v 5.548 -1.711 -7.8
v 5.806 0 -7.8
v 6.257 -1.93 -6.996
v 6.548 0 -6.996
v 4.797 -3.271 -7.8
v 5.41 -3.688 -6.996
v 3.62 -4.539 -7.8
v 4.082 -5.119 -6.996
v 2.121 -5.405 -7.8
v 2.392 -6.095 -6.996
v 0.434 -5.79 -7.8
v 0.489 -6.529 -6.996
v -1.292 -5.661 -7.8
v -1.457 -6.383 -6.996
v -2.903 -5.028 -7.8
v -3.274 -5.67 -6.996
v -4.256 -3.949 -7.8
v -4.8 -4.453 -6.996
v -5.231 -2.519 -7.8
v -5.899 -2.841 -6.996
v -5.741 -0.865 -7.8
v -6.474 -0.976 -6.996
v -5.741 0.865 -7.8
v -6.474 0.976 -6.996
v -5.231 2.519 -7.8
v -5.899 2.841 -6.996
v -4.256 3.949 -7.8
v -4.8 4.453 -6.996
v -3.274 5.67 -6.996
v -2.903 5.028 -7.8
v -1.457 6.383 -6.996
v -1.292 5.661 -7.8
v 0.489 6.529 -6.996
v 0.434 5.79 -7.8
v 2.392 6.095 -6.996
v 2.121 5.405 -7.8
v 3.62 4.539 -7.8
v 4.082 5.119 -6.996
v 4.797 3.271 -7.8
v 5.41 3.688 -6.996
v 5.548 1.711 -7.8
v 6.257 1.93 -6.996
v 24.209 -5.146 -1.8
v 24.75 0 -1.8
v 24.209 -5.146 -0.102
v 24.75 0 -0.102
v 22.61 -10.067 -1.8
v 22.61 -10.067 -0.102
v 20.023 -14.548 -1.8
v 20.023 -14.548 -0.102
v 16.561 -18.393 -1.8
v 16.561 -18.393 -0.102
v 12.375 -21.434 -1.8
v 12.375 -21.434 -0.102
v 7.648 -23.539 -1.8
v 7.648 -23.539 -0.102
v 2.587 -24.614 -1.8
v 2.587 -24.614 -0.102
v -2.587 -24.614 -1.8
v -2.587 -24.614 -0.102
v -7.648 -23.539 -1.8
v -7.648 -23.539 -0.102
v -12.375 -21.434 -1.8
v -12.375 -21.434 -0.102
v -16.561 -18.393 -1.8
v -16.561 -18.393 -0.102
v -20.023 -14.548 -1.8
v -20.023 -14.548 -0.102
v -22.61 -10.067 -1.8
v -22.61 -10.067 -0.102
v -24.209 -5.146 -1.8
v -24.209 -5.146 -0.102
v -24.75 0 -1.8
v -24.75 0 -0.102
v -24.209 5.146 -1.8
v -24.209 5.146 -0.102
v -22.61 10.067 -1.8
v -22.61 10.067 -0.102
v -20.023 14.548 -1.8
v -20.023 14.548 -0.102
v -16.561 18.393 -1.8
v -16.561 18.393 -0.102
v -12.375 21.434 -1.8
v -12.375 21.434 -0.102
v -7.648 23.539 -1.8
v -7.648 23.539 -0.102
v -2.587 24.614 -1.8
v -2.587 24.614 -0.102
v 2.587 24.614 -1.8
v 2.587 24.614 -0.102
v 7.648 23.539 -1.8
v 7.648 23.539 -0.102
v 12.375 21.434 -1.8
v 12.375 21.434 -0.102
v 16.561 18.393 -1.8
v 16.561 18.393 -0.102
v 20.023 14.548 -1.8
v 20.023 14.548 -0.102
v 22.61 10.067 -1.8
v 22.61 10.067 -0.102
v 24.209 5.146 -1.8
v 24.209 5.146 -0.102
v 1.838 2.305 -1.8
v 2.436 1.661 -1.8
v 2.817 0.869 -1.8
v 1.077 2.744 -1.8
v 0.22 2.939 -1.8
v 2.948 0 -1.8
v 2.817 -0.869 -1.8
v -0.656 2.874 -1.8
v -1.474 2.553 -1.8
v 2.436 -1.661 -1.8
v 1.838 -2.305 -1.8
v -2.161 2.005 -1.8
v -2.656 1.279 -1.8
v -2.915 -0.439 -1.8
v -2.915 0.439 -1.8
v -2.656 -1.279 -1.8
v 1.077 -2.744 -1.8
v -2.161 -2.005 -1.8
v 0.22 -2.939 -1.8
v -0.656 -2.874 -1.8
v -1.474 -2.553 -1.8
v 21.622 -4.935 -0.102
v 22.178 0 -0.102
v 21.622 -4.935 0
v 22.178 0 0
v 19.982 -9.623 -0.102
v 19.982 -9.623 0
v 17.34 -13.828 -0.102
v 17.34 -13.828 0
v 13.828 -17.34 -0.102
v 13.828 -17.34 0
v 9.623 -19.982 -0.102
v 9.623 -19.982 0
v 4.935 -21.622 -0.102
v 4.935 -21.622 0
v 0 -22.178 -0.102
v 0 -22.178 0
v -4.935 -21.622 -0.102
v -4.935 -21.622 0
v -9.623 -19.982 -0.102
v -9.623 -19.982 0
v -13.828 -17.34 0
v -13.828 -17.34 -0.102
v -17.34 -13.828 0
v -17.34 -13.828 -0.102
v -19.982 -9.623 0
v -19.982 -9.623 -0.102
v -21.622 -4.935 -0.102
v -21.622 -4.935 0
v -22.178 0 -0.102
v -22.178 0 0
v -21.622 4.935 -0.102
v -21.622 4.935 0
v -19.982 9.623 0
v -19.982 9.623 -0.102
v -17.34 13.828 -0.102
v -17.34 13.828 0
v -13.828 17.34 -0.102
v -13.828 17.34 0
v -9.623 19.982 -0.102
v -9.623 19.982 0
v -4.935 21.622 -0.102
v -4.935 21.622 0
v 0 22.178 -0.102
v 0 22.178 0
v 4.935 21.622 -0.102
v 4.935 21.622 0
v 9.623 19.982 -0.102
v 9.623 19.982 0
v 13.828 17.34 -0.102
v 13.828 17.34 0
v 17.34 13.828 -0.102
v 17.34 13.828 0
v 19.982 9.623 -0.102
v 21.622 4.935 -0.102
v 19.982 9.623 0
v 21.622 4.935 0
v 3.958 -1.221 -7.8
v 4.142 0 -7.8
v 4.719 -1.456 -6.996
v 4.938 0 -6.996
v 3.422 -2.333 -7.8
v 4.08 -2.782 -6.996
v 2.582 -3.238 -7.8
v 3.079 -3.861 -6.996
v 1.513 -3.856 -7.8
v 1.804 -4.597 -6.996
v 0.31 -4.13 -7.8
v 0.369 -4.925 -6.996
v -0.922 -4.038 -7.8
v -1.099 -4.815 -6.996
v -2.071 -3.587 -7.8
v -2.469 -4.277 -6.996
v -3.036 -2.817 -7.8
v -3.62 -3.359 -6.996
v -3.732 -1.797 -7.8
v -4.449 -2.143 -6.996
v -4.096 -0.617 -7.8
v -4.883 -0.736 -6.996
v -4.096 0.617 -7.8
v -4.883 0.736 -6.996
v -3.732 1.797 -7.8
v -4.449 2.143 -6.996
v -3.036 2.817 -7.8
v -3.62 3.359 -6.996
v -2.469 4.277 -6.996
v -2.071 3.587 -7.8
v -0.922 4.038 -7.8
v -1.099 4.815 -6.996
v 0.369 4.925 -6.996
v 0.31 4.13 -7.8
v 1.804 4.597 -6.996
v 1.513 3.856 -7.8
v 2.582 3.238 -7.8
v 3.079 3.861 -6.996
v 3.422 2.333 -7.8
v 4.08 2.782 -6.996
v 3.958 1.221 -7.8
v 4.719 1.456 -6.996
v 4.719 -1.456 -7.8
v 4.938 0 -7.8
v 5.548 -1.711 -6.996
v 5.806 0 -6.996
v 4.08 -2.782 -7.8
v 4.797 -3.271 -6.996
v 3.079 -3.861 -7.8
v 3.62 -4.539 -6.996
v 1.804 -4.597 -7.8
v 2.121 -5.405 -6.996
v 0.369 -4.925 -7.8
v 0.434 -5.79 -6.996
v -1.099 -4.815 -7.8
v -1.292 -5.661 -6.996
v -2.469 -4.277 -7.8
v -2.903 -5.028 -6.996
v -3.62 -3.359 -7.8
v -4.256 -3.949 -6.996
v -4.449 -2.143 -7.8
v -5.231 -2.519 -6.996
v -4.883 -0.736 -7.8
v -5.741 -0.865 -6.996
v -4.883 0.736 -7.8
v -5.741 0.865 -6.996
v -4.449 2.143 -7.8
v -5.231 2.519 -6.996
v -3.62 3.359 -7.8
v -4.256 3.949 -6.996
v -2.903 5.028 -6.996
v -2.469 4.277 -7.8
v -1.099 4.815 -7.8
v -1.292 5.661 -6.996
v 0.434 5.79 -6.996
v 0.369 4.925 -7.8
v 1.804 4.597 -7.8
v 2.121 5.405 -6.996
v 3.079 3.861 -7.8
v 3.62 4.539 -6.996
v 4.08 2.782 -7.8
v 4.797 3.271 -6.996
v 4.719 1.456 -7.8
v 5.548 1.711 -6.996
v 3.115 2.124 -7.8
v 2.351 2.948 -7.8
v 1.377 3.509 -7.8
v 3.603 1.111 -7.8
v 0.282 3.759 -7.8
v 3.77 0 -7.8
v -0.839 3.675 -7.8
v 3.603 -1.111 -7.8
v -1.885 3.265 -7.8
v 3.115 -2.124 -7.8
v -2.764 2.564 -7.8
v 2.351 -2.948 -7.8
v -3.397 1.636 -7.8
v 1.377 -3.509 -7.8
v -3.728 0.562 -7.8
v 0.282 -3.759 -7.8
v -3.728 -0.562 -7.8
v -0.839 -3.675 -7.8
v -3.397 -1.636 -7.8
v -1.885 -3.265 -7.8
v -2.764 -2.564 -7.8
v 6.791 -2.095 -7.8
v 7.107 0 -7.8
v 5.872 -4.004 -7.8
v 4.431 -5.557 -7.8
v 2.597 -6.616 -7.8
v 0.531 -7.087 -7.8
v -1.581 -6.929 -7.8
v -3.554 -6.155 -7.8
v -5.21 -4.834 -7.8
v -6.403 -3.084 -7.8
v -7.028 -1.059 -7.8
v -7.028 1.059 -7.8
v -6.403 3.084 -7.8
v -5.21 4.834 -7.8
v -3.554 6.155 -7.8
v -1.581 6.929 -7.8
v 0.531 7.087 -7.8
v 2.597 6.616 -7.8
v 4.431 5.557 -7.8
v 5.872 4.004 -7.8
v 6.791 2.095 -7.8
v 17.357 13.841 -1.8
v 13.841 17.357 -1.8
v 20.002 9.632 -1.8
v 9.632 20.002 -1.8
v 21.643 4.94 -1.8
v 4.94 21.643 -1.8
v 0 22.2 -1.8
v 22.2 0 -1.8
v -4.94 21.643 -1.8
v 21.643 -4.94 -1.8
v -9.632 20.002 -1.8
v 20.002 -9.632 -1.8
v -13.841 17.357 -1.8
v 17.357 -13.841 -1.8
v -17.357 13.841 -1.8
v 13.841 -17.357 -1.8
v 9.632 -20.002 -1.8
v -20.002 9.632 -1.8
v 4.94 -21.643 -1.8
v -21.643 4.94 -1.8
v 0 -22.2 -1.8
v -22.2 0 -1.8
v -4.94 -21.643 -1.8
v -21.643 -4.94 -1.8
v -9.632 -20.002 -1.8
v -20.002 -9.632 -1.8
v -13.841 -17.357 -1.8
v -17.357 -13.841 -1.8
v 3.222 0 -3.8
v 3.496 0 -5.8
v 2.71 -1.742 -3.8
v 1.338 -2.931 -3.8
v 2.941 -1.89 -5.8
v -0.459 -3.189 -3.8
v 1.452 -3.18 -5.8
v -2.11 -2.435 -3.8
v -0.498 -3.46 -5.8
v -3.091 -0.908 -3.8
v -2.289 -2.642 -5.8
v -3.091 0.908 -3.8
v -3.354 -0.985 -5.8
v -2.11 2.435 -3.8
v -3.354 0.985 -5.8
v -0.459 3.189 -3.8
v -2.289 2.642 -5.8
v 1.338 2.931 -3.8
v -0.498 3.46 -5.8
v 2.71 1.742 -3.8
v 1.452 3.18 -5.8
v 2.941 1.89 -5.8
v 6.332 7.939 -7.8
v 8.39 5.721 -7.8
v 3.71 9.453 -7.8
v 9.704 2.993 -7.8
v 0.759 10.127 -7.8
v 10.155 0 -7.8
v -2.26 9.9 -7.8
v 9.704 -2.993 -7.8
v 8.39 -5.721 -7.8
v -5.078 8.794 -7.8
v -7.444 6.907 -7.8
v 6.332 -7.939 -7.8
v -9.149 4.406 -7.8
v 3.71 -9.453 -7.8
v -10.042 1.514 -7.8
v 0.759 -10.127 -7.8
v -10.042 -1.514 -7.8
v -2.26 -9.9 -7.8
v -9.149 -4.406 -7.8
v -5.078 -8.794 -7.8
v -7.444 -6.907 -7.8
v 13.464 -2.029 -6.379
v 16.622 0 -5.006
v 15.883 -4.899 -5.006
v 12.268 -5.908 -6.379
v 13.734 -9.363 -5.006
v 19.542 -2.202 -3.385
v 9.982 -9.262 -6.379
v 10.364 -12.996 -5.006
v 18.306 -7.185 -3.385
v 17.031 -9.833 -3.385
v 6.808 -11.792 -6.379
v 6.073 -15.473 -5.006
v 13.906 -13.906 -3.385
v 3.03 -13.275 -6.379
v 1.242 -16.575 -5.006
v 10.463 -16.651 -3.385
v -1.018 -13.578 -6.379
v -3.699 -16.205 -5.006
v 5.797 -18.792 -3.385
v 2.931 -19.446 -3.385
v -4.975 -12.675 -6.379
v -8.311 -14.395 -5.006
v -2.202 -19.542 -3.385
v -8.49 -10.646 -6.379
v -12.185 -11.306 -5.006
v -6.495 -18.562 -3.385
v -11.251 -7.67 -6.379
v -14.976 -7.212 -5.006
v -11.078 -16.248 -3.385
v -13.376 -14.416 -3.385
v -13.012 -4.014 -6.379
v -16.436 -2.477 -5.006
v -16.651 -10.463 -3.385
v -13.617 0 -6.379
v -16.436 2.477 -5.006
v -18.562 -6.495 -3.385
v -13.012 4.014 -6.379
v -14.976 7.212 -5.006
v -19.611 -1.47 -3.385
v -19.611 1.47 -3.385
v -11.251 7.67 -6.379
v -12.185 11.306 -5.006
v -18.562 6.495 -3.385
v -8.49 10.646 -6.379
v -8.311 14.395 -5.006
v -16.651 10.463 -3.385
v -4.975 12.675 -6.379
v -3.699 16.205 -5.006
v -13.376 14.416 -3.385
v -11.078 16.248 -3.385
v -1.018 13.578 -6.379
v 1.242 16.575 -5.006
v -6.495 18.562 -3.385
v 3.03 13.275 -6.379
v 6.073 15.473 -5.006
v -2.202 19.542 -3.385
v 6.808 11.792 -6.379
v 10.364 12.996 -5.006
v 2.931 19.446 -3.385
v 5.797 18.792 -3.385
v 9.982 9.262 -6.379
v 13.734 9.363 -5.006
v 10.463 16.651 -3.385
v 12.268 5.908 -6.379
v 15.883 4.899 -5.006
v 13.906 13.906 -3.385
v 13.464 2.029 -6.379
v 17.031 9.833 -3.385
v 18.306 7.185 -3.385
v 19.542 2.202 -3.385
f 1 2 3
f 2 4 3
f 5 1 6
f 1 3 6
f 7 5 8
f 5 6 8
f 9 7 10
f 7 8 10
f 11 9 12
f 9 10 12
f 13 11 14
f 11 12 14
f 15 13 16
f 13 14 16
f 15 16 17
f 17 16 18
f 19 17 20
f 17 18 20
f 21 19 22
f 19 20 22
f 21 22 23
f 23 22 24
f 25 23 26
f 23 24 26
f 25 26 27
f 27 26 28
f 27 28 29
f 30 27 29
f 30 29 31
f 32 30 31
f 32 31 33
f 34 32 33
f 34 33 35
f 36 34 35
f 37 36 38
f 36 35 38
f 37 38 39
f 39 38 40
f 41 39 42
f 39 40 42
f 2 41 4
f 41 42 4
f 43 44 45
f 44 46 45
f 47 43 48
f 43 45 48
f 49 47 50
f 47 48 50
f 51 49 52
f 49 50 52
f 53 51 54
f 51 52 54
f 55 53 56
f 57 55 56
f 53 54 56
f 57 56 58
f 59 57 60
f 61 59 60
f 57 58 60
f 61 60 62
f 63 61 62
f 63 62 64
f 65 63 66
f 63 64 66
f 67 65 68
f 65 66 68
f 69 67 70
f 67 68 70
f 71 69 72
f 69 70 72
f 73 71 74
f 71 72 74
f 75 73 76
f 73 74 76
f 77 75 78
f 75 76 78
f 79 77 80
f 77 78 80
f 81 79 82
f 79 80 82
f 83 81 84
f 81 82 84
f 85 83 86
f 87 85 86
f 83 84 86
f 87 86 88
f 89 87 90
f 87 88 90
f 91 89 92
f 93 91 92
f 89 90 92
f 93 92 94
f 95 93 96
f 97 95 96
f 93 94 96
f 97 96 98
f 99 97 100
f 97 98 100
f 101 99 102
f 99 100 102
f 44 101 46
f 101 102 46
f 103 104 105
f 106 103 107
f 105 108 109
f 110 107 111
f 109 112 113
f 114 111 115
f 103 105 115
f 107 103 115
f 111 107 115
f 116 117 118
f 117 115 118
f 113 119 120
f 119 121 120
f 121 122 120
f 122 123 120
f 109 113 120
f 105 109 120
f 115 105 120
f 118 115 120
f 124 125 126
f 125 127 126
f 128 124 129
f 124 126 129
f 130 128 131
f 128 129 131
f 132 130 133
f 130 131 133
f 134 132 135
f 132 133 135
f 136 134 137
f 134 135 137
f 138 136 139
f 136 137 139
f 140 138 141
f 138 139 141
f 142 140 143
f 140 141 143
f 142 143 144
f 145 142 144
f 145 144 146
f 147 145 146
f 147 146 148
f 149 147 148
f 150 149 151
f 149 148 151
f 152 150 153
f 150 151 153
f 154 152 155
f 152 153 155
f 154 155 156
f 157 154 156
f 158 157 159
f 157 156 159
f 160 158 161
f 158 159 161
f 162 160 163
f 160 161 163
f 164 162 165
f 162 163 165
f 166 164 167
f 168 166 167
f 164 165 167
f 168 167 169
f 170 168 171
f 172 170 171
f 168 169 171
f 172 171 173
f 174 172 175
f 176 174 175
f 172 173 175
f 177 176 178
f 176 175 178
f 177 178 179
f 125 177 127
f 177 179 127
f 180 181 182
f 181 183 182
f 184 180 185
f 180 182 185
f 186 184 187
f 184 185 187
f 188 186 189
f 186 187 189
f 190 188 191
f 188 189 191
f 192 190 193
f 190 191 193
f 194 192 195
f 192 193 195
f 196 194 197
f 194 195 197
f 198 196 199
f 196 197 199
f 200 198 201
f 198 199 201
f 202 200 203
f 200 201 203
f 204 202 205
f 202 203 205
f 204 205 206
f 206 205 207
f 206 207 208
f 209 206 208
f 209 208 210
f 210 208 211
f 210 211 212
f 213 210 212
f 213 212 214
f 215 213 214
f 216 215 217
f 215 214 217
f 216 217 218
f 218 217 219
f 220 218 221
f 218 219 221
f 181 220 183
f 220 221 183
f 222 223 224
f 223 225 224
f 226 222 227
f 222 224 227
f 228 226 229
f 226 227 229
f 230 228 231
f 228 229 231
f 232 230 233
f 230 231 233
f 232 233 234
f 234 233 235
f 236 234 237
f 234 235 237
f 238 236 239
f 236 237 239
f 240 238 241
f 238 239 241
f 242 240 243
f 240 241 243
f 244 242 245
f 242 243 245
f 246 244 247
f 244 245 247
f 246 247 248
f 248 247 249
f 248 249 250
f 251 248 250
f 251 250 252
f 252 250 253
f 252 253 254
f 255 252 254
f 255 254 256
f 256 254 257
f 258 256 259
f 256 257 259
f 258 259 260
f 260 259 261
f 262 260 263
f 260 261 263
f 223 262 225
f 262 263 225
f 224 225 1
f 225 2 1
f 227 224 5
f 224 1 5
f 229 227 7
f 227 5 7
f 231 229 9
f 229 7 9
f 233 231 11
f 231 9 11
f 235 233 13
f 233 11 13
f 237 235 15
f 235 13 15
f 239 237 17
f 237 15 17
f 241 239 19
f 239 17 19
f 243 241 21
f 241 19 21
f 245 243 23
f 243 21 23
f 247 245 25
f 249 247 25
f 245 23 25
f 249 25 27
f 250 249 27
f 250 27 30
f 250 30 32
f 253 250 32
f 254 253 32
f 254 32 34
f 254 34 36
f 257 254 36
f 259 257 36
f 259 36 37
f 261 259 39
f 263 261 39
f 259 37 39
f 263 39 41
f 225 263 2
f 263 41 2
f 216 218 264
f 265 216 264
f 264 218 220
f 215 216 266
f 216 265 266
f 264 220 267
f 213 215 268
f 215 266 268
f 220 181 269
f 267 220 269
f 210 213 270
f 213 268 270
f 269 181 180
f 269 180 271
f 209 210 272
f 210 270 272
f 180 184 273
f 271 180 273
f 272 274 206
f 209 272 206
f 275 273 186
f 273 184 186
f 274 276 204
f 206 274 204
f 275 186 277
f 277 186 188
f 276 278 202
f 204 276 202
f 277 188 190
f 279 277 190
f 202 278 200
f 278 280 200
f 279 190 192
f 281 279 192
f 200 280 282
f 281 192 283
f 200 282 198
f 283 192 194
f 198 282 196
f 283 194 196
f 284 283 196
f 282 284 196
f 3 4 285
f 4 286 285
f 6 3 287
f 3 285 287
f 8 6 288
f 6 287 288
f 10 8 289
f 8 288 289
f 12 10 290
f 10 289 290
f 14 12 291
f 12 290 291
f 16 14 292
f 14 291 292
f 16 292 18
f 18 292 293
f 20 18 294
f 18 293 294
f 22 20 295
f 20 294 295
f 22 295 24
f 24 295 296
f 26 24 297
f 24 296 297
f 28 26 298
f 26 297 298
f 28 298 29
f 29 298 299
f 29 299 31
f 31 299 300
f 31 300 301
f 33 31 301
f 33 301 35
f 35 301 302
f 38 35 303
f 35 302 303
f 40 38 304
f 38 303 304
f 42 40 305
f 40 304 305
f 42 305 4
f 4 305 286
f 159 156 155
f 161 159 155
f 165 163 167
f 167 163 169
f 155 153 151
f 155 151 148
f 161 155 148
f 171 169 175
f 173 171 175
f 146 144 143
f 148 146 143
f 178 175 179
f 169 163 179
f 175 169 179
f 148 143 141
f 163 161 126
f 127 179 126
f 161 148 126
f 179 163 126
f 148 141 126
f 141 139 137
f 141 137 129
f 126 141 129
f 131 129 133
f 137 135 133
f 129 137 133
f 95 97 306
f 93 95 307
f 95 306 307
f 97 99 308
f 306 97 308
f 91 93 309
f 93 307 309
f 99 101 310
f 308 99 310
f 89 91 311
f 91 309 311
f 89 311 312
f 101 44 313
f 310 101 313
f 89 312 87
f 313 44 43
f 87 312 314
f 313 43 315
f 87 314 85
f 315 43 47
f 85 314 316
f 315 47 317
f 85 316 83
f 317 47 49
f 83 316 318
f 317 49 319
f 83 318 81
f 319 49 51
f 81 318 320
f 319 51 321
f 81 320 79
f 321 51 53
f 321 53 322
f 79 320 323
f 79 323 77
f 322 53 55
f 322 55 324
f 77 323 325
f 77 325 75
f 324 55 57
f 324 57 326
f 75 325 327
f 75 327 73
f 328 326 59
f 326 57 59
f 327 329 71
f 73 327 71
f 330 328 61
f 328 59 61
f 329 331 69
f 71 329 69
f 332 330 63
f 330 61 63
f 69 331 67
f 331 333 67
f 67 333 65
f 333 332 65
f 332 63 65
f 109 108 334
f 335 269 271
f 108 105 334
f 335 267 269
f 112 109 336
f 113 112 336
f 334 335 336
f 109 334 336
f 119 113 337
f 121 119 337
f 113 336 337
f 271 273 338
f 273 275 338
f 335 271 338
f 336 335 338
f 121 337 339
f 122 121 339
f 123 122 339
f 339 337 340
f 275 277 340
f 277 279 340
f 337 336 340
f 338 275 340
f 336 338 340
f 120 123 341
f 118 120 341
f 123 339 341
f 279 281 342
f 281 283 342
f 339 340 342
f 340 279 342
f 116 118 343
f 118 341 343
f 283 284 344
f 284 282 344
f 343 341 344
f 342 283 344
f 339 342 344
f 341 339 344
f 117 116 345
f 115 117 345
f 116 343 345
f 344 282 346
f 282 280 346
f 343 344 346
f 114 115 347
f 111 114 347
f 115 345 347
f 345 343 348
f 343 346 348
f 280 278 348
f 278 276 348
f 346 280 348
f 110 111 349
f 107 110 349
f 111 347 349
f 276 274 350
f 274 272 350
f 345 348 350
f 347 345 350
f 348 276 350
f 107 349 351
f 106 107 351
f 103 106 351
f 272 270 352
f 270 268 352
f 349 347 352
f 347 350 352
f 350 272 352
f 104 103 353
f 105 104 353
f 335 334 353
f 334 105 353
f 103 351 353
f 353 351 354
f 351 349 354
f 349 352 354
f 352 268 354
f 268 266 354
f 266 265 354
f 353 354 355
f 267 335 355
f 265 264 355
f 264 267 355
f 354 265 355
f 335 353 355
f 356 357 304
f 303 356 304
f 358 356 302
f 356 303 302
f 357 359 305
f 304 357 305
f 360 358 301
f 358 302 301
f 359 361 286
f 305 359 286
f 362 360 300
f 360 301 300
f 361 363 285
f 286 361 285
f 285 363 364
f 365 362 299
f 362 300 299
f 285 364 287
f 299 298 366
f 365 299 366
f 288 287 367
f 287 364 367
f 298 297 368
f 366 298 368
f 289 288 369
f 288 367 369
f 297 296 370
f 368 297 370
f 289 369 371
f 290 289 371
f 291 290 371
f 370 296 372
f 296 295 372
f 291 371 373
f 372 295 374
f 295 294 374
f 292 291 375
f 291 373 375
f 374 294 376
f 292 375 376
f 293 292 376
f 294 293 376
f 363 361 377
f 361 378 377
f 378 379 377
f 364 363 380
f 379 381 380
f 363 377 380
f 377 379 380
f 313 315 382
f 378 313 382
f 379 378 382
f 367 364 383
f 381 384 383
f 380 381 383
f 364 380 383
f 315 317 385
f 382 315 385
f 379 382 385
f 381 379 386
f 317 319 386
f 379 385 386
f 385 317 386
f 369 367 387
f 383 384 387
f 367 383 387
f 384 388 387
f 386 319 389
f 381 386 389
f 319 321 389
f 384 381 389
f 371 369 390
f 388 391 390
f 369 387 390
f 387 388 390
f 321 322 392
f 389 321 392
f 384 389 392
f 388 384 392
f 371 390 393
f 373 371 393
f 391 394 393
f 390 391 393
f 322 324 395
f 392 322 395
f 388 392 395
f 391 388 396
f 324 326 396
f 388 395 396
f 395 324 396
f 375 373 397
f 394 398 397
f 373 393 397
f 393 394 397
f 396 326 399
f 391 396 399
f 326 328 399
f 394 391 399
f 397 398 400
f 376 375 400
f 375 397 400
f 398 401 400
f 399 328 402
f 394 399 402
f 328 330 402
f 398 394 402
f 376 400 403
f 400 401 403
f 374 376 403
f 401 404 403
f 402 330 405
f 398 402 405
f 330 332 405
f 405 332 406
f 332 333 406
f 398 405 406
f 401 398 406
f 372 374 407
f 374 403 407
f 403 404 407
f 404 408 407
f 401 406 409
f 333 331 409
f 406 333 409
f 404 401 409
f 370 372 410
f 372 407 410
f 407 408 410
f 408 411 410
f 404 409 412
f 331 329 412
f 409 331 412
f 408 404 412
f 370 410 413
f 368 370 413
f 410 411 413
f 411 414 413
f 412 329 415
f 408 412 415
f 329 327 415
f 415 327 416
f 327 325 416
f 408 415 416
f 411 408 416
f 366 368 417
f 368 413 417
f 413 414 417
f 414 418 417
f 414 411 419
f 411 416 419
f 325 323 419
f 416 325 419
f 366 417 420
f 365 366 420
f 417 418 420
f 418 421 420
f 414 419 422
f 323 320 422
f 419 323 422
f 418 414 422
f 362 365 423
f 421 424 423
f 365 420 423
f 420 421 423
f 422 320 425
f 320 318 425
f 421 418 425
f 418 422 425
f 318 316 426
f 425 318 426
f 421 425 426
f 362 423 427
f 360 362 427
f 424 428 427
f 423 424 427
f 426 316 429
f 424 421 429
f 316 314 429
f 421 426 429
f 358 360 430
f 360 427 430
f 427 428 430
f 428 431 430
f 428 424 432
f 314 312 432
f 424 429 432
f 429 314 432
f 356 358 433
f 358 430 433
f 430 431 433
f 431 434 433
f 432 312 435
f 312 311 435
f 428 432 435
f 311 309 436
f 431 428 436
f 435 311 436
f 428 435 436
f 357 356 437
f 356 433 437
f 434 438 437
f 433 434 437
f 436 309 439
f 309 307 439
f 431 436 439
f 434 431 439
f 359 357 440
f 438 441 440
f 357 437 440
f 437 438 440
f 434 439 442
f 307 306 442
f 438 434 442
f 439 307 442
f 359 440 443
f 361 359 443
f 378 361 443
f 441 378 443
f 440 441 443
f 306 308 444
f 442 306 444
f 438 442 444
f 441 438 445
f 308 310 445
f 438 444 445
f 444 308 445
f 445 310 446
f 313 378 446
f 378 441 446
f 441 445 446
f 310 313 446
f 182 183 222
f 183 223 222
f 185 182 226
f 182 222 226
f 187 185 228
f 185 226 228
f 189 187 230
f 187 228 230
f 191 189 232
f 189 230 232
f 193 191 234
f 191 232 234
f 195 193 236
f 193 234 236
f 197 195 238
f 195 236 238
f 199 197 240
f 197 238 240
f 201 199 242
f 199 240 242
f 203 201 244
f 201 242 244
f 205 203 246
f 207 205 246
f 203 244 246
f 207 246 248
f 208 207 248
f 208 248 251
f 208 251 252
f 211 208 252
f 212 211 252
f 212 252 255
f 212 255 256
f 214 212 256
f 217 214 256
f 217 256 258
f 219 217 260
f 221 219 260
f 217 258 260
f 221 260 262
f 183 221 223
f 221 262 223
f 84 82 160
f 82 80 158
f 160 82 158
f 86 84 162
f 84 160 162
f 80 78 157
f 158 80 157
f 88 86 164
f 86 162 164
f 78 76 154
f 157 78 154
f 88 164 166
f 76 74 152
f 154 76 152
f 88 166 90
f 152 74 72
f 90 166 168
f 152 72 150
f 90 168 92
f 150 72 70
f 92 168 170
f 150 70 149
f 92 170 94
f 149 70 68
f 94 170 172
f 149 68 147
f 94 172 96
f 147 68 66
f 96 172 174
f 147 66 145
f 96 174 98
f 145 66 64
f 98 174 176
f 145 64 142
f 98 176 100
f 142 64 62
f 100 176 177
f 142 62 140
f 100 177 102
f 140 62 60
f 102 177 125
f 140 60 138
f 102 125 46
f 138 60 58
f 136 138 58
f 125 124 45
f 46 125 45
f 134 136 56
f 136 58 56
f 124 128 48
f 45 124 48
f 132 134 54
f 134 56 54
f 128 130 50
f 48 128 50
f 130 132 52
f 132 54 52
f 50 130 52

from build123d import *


with BuildPart() as f1:
    # F0 (on Front) → F1 (revolve)
    with BuildSketch(Plane.XZ):
        with BuildLine():
            Line((22.1780724823, 0), (0, 0))
            Line((0, 0), (0, -1.8))
            Line((0, -1.8), (2.9477034695, -1.8))
            Line((2.9477034695, -1.8), (3.77, -7.8))
            Line((3.77, -7.8), (4.1418569162, -7.8))
            Line((4.1418569162, -7.8), (4.9383593723, -6.9958153181))
            Line((4.9383593723, -6.9958153181), (4.9383593723, -7.8))
            Line((4.9383593723, -7.8), (5.8062141761, -6.9958153181))
            Line((5.8062141761, -6.9958153181), (5.8062141761, -7.8))
            Line((5.8062141761, -7.8), (6.5475506708, -6.9958153181))
            Line((6.5475506708, -6.9958153181), (7.1071940474, -7.8))
            Line((7.1071940474, -7.8), (10.155, -7.8))
            add(Edge.make_bspline(
                [(10.155, -7.8), (12.8875457393, -6.6985920118), (16.5135470556, -5.2238716882), (20.9377328626, -2.6968105647), (22.2, -1.8)],
                knots=[0, 0, 0, 0, 0.5227412825, 1, 1, 1, 1], degree=3))
            Line((22.2, -1.8), (24.75, -1.8))
            Line((24.75, -1.8), (24.75, -0.1024712838))
            Line((24.75, -0.1024712838), (22.1780724823, -0.1024712838))
            Line((22.1780724823, -0.1024712838), (22.1780724823, 0))
        make_face()
    revolve(axis=Axis((0, 0, -0.9), (0, 0, -1)))


solid = f1.part
